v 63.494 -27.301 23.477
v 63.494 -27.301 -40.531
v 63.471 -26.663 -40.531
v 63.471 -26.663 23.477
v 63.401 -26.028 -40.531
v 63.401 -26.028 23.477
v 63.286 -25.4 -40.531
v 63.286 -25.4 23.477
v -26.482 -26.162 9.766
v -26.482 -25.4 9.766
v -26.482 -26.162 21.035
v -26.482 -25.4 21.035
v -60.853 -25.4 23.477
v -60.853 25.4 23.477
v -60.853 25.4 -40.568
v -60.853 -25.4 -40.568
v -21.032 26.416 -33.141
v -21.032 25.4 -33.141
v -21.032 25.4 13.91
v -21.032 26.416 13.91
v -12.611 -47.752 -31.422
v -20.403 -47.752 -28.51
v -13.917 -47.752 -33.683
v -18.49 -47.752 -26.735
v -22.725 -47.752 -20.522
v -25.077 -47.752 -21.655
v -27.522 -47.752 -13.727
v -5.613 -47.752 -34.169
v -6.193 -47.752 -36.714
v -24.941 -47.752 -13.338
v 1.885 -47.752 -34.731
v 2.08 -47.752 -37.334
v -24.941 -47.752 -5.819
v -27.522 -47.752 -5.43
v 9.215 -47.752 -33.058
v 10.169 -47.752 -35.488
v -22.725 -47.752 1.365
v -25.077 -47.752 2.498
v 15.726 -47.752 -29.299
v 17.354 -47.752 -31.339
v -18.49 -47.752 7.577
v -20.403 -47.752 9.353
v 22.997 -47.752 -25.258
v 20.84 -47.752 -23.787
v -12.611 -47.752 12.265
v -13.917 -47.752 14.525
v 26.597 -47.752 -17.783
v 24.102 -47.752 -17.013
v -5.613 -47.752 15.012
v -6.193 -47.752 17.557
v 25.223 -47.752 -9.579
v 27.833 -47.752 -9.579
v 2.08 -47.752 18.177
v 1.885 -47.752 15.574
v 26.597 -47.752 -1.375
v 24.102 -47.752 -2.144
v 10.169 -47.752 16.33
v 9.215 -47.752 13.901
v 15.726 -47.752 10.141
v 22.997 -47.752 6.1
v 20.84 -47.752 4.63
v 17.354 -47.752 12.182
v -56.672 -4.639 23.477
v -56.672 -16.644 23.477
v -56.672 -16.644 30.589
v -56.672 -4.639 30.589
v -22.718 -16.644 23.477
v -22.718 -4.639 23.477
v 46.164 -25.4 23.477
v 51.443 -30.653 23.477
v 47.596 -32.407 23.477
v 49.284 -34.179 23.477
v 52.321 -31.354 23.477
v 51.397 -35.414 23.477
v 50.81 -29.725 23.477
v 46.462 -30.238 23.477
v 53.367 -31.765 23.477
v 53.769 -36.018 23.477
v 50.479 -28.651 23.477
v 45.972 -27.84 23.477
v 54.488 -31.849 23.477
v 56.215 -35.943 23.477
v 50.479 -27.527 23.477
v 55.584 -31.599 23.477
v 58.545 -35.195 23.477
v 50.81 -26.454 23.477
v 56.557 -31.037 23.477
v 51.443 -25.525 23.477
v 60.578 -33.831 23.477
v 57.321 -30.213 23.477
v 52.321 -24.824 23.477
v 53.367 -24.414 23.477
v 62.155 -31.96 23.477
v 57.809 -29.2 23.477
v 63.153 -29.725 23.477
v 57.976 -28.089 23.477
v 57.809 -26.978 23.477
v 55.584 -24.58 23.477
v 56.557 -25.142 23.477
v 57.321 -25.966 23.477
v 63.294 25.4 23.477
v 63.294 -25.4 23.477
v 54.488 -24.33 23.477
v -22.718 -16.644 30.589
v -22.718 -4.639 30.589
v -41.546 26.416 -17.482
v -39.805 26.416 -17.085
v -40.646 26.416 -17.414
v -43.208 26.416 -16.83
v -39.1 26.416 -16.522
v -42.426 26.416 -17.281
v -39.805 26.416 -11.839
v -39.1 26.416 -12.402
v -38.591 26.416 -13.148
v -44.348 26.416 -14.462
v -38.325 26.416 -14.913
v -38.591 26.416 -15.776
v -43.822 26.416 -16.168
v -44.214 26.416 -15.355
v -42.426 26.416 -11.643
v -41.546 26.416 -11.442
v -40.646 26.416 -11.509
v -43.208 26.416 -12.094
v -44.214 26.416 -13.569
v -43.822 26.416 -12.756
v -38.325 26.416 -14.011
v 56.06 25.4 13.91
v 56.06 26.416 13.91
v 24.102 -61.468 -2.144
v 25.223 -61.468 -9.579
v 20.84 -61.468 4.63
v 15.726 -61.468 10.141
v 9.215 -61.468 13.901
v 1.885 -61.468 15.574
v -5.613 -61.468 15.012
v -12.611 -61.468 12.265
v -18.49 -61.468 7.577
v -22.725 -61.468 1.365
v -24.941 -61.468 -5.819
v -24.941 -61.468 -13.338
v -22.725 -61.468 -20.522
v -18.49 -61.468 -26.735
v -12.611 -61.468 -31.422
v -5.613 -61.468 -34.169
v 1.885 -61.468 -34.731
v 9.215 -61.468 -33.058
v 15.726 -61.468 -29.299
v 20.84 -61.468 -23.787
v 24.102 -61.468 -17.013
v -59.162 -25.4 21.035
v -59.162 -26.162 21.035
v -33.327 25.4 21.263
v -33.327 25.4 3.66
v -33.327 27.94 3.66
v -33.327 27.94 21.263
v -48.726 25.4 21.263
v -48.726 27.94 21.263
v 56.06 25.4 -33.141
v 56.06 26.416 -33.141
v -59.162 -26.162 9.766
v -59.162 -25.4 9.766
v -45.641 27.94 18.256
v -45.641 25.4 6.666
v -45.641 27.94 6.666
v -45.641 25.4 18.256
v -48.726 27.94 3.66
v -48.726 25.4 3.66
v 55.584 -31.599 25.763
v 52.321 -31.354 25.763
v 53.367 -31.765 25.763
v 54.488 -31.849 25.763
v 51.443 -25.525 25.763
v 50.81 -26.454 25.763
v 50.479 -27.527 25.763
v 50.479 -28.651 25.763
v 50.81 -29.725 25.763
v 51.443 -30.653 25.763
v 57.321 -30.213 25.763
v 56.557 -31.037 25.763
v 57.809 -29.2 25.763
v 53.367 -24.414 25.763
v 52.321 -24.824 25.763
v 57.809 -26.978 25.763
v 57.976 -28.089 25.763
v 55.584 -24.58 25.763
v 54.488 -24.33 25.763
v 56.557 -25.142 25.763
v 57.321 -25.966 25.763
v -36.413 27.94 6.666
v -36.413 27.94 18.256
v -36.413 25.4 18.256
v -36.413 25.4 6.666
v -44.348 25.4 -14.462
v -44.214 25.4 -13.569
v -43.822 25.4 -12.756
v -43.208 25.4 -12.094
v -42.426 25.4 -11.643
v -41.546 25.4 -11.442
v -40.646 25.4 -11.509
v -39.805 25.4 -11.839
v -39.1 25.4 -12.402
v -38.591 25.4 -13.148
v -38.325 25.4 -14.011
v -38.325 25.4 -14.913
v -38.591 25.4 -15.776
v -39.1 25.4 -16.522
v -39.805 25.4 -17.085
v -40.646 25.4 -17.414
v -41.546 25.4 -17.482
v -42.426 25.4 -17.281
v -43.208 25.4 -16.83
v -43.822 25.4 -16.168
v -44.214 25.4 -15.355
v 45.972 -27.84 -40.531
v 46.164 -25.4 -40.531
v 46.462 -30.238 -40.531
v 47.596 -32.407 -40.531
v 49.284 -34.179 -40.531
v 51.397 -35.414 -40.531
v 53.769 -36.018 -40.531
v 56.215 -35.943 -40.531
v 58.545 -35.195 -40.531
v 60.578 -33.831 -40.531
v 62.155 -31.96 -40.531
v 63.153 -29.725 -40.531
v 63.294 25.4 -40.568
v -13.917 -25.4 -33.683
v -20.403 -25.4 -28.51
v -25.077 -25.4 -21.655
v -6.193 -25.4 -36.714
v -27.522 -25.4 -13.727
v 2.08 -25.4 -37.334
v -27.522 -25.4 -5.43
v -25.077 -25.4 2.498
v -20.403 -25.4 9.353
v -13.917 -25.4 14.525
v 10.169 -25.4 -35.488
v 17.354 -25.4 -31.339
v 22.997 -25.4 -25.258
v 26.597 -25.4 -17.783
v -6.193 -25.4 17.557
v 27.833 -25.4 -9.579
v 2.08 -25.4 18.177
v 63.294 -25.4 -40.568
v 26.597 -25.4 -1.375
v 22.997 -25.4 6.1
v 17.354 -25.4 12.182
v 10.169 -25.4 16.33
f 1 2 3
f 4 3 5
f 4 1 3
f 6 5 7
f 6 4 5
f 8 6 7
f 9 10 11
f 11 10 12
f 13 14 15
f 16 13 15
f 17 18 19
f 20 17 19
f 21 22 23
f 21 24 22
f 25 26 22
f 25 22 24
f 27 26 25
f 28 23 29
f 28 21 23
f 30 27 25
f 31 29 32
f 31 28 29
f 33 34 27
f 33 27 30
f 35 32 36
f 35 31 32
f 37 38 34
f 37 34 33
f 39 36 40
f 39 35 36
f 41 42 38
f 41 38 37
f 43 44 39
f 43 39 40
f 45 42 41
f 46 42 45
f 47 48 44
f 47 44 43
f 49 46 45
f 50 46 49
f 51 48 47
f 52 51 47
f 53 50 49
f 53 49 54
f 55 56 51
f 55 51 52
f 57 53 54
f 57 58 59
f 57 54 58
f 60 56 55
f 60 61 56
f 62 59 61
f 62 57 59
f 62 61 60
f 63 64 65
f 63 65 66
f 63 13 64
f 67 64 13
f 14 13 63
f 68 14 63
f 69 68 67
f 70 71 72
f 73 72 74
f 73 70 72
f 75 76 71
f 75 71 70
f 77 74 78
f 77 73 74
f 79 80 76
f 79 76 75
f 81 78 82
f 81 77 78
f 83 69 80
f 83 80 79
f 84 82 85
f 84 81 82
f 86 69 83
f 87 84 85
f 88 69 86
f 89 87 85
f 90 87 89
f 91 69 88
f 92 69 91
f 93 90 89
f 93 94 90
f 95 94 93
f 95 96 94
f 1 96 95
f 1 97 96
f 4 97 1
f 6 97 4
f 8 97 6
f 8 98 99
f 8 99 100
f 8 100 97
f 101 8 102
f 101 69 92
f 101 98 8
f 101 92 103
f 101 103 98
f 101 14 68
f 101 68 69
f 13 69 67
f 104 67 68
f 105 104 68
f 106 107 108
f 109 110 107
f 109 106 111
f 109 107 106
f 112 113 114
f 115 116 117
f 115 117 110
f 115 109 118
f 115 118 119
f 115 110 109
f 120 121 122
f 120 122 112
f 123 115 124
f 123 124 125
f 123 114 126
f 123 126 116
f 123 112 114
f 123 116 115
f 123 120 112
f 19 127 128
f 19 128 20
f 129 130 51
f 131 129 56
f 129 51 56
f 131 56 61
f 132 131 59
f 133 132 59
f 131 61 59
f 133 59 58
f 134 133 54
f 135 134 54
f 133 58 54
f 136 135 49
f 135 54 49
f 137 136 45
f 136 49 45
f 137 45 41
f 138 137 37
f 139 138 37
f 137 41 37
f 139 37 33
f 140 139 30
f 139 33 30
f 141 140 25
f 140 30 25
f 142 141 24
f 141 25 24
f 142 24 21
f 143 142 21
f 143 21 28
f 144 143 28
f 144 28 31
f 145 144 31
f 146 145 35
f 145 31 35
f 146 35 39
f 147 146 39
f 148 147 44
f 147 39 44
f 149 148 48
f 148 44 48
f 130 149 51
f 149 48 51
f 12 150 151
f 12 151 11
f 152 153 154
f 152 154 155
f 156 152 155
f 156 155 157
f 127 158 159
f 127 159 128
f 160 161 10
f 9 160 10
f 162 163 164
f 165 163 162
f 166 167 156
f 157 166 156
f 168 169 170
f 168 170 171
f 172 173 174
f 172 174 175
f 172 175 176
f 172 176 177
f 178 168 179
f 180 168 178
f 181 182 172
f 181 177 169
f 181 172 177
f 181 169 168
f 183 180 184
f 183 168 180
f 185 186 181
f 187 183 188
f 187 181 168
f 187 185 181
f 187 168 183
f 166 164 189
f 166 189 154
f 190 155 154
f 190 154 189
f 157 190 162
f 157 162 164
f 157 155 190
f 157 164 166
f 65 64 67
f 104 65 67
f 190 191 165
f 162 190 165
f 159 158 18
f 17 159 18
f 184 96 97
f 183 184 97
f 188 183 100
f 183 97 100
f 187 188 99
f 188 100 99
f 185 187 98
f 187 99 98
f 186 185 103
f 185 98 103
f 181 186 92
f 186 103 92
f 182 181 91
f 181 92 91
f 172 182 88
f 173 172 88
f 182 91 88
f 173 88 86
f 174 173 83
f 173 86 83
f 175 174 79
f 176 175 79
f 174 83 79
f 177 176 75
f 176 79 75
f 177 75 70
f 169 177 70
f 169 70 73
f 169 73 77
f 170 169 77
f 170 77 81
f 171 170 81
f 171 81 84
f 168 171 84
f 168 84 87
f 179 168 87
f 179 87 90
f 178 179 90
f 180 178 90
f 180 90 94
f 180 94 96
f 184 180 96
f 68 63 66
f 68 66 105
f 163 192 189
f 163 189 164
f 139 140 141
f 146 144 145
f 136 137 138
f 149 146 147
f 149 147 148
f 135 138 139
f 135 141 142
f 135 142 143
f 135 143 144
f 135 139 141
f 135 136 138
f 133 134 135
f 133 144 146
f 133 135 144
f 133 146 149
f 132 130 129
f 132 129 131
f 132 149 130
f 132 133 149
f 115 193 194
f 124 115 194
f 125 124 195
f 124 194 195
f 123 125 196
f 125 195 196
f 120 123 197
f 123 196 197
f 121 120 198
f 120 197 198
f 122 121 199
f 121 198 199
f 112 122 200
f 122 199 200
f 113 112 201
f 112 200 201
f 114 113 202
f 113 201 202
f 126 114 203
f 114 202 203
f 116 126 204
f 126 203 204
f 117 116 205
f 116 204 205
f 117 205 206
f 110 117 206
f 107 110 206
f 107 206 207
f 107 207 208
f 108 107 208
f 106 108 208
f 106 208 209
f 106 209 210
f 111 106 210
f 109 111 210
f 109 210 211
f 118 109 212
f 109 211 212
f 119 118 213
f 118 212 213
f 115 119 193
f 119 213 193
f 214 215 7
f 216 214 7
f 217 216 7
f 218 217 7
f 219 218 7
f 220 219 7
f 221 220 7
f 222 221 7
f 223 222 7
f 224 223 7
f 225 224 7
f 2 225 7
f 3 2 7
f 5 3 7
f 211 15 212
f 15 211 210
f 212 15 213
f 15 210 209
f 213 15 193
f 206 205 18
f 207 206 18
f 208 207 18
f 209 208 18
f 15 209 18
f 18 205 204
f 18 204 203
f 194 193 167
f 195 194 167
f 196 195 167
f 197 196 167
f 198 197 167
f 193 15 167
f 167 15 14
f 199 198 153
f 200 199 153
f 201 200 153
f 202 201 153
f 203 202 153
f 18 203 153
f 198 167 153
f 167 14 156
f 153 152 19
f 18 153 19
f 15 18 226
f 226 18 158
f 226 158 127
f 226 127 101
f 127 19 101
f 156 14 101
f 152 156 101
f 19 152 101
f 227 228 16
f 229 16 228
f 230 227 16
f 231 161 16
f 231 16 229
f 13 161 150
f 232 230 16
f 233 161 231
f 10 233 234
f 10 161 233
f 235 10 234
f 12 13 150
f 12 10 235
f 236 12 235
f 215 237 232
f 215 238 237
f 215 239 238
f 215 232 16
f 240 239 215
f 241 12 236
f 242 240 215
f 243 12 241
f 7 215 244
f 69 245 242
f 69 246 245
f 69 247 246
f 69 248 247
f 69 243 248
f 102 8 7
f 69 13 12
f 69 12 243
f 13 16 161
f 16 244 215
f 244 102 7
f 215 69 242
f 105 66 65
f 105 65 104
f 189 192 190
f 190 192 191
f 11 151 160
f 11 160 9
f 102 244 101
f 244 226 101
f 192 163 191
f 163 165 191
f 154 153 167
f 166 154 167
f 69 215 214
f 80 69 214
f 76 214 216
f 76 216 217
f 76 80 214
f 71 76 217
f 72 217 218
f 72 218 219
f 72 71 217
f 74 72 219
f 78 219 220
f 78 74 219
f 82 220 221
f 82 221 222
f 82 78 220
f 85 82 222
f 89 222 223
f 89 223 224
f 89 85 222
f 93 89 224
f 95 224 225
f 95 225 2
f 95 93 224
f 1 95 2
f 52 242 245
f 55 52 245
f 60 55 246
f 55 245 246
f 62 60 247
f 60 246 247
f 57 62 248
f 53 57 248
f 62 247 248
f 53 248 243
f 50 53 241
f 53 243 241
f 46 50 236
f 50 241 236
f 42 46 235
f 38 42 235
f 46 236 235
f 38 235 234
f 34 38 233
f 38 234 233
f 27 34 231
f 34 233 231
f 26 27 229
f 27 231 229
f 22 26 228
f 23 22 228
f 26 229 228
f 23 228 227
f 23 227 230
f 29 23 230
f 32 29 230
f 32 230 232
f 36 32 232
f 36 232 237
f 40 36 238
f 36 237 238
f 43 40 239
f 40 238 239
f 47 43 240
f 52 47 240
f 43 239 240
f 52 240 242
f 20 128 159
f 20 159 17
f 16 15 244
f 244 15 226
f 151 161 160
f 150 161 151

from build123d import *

# Parameters (mm, degrees)
F1_R      = 26.2655065646
F2_DEPTH  = 25.4
F3_DEPTH  = 25.4
F4_DEPTH  = 25.4
F5_R      = 27.8330469694
F6_DEPTH  = 22.352
F8_W      = 33.9538175613
F8_H      = 12.0044872165
F9_DEPTH  = 7.112
F11_R     = 3.0284549087
F13_DEPTH = 1.016
F14_R     = 8.9450781304
F14_R_2   = 3.0284549087
F15_DEPTH = 0.762
F16_R     = 25.222843128
F17_DEPTH = 0.762
F19_R     = 3.7698908718
F20_DEPTH = 2.286
F21_W     = 32.6801389456
F21_H     = 11.2690133974
F22_DEPTH = 0.762
F24_DEPTH = 64.008
F25_DEPTH = 12.954
F10_W     = 77.0918577909
F10_H     = 47.0512080938
F26_DEPTH = 1.016
F27_W     = 15.3993144631
F27_H     = 17.6025833935
F27_W_2   = 9.2281326652
F27_H_2   = 11.5900784731
F28_DEPTH = 2.54


with BuildPart() as f2:
    # F1 (on face) → F2 (new body)
    with BuildSketch(Plane.XZ):
        with Locations((-2.629437251, -9.2030279338)):
            Circle(F1_R)
    extrude(amount=F2_DEPTH)

    # F0 (on Front) → F3 (join)
    with BuildSketch(Plane.XZ):
        Polygon((-50.7105626166, 23.4771128744), (-60.85267663, 23.4771128744), (-60.85267663, -40.5684486032), (63.2942989469, -40.5684486032), (63.2942989469, 23.4771128744), (-24.228380993, 23.4771128744), align=None)
    extrude(amount=-F3_DEPTH)

    # F4 (add): a face of the model
    f4_faces = [f2.faces().sort_by_distance(p)[0] for p in [
        (1.2208111584, 0, 22.0801767452),
    ]]
    extrude(f4_faces, amount=F4_DEPTH)

    # F5 (on face) → F6 (join)
    with BuildSketch(Plane.XZ.offset(25.4)):
        with Locations((0, -9.5786619931)):
            Circle(F5_R)
    extrude(amount=F6_DEPTH)

    # F8 (on face) → F9 (join)
    with BuildSketch(Plane.XY.offset(23.4771128744)):
        with Locations((-39.6948745474, -10.6415767223)):
            Rectangle(F8_W, F8_H)
    extrude(amount=F9_DEPTH)

    # F11 (on face) → F13 (join)
    with BuildSketch(Plane(origin=(0, 25.4, 0), x_dir=(-1, 0, 0), z_dir=(0, 1, 0))):
        with Locations((41.3197204471, -14.4619019702)):
            Circle(F11_R)
    extrude(amount=F13_DEPTH)

    # F14 (on face) → F15 (join)
    with BuildSketch(Plane(origin=(0, 25.4, 0), x_dir=(-1, 0, 0), z_dir=(0, 1, 0))):
        with Locations((41.3197204471, -14.4619019702)):
            Circle(F14_R)
        with Locations((41.3197204471, -14.4619019702)):
            Circle(F14_R_2, mode=Mode.SUBTRACT)
    extrude(amount=-F15_DEPTH)

    # F16 (on face) → F17 (join)
    with BuildSketch(Plane.XZ.offset(47.752)):
        with Locations((0, -9.5786619931)):
            Circle(F16_R)
    extrude(amount=F17_DEPTH)

    # F19 (on face) → F20 (join)
    with BuildSketch(Plane.XY.offset(23.4771128744)):
        with Locations((54.2063601315, -28.089210391)):
            Circle(F19_R)
    extrude(amount=F20_DEPTH)

    # F21 (on face) → F22 (join)
    with BuildSketch(Plane.XZ.offset(25.4)):
        with Locations((-42.822252959, 15.4009857215)):
            Rectangle(F21_W, F21_H)
    extrude(amount=F22_DEPTH)

    # F23 (on face) → F24 (join)
    with BuildSketch(Plane.XY.offset(23.4771128744)):
        with BuildLine():
            ThreePointArc((46.1644789676, -25.4), (53.7686719478, -36.0181838323), (63.4942040761, -27.3013263941))
            ThreePointArc((63.4942040761, -27.3013263941), (63.4418971886, -26.3449585915), (63.2856005331, -25.4))
            Line((63.2856005331, -25.4), (46.1644789676, -25.4))
        make_face()
        with BuildLine():
            Line((46.1644789676, -25.4), (63.2856005331, -25.4))
            ThreePointArc((63.2856005331, -25.4), (54.7250397503, -18.5321620683), (46.1644789676, -25.4))
        make_face()
    extrude(amount=-F24_DEPTH)

    # F25 (add): a face of the model
    f25_faces = [f2.faces().sort_by_distance(p)[0] for p in [
        (0, -48.514, -9.5786619931),
    ]]
    extrude(f25_faces, amount=F25_DEPTH)

    # F10 (on face) → F26 (join)
    with BuildSketch(Plane(origin=(0, 25.4, 0), x_dir=(-1, 0, 0), z_dir=(0, 1, 0))):
        with Locations((-17.513666302, -9.6154874191)):
            Rectangle(F10_W, F10_H)
    extrude(amount=F26_DEPTH)

    # F27 (on face) → F28 (join)
    with BuildSketch(Plane(origin=(0, 25.4, 0), x_dir=(-1, 0, 0), z_dir=(0, 1, 0))):
        with Locations((41.0268343985, 12.4612255022)):
            Rectangle(F27_W, F27_H)
        with Locations((41.0268343985, 12.4612255022)):
            Rectangle(F27_W_2, F27_H_2, mode=Mode.SUBTRACT)
    extrude(amount=F28_DEPTH)


solid = f2.part
